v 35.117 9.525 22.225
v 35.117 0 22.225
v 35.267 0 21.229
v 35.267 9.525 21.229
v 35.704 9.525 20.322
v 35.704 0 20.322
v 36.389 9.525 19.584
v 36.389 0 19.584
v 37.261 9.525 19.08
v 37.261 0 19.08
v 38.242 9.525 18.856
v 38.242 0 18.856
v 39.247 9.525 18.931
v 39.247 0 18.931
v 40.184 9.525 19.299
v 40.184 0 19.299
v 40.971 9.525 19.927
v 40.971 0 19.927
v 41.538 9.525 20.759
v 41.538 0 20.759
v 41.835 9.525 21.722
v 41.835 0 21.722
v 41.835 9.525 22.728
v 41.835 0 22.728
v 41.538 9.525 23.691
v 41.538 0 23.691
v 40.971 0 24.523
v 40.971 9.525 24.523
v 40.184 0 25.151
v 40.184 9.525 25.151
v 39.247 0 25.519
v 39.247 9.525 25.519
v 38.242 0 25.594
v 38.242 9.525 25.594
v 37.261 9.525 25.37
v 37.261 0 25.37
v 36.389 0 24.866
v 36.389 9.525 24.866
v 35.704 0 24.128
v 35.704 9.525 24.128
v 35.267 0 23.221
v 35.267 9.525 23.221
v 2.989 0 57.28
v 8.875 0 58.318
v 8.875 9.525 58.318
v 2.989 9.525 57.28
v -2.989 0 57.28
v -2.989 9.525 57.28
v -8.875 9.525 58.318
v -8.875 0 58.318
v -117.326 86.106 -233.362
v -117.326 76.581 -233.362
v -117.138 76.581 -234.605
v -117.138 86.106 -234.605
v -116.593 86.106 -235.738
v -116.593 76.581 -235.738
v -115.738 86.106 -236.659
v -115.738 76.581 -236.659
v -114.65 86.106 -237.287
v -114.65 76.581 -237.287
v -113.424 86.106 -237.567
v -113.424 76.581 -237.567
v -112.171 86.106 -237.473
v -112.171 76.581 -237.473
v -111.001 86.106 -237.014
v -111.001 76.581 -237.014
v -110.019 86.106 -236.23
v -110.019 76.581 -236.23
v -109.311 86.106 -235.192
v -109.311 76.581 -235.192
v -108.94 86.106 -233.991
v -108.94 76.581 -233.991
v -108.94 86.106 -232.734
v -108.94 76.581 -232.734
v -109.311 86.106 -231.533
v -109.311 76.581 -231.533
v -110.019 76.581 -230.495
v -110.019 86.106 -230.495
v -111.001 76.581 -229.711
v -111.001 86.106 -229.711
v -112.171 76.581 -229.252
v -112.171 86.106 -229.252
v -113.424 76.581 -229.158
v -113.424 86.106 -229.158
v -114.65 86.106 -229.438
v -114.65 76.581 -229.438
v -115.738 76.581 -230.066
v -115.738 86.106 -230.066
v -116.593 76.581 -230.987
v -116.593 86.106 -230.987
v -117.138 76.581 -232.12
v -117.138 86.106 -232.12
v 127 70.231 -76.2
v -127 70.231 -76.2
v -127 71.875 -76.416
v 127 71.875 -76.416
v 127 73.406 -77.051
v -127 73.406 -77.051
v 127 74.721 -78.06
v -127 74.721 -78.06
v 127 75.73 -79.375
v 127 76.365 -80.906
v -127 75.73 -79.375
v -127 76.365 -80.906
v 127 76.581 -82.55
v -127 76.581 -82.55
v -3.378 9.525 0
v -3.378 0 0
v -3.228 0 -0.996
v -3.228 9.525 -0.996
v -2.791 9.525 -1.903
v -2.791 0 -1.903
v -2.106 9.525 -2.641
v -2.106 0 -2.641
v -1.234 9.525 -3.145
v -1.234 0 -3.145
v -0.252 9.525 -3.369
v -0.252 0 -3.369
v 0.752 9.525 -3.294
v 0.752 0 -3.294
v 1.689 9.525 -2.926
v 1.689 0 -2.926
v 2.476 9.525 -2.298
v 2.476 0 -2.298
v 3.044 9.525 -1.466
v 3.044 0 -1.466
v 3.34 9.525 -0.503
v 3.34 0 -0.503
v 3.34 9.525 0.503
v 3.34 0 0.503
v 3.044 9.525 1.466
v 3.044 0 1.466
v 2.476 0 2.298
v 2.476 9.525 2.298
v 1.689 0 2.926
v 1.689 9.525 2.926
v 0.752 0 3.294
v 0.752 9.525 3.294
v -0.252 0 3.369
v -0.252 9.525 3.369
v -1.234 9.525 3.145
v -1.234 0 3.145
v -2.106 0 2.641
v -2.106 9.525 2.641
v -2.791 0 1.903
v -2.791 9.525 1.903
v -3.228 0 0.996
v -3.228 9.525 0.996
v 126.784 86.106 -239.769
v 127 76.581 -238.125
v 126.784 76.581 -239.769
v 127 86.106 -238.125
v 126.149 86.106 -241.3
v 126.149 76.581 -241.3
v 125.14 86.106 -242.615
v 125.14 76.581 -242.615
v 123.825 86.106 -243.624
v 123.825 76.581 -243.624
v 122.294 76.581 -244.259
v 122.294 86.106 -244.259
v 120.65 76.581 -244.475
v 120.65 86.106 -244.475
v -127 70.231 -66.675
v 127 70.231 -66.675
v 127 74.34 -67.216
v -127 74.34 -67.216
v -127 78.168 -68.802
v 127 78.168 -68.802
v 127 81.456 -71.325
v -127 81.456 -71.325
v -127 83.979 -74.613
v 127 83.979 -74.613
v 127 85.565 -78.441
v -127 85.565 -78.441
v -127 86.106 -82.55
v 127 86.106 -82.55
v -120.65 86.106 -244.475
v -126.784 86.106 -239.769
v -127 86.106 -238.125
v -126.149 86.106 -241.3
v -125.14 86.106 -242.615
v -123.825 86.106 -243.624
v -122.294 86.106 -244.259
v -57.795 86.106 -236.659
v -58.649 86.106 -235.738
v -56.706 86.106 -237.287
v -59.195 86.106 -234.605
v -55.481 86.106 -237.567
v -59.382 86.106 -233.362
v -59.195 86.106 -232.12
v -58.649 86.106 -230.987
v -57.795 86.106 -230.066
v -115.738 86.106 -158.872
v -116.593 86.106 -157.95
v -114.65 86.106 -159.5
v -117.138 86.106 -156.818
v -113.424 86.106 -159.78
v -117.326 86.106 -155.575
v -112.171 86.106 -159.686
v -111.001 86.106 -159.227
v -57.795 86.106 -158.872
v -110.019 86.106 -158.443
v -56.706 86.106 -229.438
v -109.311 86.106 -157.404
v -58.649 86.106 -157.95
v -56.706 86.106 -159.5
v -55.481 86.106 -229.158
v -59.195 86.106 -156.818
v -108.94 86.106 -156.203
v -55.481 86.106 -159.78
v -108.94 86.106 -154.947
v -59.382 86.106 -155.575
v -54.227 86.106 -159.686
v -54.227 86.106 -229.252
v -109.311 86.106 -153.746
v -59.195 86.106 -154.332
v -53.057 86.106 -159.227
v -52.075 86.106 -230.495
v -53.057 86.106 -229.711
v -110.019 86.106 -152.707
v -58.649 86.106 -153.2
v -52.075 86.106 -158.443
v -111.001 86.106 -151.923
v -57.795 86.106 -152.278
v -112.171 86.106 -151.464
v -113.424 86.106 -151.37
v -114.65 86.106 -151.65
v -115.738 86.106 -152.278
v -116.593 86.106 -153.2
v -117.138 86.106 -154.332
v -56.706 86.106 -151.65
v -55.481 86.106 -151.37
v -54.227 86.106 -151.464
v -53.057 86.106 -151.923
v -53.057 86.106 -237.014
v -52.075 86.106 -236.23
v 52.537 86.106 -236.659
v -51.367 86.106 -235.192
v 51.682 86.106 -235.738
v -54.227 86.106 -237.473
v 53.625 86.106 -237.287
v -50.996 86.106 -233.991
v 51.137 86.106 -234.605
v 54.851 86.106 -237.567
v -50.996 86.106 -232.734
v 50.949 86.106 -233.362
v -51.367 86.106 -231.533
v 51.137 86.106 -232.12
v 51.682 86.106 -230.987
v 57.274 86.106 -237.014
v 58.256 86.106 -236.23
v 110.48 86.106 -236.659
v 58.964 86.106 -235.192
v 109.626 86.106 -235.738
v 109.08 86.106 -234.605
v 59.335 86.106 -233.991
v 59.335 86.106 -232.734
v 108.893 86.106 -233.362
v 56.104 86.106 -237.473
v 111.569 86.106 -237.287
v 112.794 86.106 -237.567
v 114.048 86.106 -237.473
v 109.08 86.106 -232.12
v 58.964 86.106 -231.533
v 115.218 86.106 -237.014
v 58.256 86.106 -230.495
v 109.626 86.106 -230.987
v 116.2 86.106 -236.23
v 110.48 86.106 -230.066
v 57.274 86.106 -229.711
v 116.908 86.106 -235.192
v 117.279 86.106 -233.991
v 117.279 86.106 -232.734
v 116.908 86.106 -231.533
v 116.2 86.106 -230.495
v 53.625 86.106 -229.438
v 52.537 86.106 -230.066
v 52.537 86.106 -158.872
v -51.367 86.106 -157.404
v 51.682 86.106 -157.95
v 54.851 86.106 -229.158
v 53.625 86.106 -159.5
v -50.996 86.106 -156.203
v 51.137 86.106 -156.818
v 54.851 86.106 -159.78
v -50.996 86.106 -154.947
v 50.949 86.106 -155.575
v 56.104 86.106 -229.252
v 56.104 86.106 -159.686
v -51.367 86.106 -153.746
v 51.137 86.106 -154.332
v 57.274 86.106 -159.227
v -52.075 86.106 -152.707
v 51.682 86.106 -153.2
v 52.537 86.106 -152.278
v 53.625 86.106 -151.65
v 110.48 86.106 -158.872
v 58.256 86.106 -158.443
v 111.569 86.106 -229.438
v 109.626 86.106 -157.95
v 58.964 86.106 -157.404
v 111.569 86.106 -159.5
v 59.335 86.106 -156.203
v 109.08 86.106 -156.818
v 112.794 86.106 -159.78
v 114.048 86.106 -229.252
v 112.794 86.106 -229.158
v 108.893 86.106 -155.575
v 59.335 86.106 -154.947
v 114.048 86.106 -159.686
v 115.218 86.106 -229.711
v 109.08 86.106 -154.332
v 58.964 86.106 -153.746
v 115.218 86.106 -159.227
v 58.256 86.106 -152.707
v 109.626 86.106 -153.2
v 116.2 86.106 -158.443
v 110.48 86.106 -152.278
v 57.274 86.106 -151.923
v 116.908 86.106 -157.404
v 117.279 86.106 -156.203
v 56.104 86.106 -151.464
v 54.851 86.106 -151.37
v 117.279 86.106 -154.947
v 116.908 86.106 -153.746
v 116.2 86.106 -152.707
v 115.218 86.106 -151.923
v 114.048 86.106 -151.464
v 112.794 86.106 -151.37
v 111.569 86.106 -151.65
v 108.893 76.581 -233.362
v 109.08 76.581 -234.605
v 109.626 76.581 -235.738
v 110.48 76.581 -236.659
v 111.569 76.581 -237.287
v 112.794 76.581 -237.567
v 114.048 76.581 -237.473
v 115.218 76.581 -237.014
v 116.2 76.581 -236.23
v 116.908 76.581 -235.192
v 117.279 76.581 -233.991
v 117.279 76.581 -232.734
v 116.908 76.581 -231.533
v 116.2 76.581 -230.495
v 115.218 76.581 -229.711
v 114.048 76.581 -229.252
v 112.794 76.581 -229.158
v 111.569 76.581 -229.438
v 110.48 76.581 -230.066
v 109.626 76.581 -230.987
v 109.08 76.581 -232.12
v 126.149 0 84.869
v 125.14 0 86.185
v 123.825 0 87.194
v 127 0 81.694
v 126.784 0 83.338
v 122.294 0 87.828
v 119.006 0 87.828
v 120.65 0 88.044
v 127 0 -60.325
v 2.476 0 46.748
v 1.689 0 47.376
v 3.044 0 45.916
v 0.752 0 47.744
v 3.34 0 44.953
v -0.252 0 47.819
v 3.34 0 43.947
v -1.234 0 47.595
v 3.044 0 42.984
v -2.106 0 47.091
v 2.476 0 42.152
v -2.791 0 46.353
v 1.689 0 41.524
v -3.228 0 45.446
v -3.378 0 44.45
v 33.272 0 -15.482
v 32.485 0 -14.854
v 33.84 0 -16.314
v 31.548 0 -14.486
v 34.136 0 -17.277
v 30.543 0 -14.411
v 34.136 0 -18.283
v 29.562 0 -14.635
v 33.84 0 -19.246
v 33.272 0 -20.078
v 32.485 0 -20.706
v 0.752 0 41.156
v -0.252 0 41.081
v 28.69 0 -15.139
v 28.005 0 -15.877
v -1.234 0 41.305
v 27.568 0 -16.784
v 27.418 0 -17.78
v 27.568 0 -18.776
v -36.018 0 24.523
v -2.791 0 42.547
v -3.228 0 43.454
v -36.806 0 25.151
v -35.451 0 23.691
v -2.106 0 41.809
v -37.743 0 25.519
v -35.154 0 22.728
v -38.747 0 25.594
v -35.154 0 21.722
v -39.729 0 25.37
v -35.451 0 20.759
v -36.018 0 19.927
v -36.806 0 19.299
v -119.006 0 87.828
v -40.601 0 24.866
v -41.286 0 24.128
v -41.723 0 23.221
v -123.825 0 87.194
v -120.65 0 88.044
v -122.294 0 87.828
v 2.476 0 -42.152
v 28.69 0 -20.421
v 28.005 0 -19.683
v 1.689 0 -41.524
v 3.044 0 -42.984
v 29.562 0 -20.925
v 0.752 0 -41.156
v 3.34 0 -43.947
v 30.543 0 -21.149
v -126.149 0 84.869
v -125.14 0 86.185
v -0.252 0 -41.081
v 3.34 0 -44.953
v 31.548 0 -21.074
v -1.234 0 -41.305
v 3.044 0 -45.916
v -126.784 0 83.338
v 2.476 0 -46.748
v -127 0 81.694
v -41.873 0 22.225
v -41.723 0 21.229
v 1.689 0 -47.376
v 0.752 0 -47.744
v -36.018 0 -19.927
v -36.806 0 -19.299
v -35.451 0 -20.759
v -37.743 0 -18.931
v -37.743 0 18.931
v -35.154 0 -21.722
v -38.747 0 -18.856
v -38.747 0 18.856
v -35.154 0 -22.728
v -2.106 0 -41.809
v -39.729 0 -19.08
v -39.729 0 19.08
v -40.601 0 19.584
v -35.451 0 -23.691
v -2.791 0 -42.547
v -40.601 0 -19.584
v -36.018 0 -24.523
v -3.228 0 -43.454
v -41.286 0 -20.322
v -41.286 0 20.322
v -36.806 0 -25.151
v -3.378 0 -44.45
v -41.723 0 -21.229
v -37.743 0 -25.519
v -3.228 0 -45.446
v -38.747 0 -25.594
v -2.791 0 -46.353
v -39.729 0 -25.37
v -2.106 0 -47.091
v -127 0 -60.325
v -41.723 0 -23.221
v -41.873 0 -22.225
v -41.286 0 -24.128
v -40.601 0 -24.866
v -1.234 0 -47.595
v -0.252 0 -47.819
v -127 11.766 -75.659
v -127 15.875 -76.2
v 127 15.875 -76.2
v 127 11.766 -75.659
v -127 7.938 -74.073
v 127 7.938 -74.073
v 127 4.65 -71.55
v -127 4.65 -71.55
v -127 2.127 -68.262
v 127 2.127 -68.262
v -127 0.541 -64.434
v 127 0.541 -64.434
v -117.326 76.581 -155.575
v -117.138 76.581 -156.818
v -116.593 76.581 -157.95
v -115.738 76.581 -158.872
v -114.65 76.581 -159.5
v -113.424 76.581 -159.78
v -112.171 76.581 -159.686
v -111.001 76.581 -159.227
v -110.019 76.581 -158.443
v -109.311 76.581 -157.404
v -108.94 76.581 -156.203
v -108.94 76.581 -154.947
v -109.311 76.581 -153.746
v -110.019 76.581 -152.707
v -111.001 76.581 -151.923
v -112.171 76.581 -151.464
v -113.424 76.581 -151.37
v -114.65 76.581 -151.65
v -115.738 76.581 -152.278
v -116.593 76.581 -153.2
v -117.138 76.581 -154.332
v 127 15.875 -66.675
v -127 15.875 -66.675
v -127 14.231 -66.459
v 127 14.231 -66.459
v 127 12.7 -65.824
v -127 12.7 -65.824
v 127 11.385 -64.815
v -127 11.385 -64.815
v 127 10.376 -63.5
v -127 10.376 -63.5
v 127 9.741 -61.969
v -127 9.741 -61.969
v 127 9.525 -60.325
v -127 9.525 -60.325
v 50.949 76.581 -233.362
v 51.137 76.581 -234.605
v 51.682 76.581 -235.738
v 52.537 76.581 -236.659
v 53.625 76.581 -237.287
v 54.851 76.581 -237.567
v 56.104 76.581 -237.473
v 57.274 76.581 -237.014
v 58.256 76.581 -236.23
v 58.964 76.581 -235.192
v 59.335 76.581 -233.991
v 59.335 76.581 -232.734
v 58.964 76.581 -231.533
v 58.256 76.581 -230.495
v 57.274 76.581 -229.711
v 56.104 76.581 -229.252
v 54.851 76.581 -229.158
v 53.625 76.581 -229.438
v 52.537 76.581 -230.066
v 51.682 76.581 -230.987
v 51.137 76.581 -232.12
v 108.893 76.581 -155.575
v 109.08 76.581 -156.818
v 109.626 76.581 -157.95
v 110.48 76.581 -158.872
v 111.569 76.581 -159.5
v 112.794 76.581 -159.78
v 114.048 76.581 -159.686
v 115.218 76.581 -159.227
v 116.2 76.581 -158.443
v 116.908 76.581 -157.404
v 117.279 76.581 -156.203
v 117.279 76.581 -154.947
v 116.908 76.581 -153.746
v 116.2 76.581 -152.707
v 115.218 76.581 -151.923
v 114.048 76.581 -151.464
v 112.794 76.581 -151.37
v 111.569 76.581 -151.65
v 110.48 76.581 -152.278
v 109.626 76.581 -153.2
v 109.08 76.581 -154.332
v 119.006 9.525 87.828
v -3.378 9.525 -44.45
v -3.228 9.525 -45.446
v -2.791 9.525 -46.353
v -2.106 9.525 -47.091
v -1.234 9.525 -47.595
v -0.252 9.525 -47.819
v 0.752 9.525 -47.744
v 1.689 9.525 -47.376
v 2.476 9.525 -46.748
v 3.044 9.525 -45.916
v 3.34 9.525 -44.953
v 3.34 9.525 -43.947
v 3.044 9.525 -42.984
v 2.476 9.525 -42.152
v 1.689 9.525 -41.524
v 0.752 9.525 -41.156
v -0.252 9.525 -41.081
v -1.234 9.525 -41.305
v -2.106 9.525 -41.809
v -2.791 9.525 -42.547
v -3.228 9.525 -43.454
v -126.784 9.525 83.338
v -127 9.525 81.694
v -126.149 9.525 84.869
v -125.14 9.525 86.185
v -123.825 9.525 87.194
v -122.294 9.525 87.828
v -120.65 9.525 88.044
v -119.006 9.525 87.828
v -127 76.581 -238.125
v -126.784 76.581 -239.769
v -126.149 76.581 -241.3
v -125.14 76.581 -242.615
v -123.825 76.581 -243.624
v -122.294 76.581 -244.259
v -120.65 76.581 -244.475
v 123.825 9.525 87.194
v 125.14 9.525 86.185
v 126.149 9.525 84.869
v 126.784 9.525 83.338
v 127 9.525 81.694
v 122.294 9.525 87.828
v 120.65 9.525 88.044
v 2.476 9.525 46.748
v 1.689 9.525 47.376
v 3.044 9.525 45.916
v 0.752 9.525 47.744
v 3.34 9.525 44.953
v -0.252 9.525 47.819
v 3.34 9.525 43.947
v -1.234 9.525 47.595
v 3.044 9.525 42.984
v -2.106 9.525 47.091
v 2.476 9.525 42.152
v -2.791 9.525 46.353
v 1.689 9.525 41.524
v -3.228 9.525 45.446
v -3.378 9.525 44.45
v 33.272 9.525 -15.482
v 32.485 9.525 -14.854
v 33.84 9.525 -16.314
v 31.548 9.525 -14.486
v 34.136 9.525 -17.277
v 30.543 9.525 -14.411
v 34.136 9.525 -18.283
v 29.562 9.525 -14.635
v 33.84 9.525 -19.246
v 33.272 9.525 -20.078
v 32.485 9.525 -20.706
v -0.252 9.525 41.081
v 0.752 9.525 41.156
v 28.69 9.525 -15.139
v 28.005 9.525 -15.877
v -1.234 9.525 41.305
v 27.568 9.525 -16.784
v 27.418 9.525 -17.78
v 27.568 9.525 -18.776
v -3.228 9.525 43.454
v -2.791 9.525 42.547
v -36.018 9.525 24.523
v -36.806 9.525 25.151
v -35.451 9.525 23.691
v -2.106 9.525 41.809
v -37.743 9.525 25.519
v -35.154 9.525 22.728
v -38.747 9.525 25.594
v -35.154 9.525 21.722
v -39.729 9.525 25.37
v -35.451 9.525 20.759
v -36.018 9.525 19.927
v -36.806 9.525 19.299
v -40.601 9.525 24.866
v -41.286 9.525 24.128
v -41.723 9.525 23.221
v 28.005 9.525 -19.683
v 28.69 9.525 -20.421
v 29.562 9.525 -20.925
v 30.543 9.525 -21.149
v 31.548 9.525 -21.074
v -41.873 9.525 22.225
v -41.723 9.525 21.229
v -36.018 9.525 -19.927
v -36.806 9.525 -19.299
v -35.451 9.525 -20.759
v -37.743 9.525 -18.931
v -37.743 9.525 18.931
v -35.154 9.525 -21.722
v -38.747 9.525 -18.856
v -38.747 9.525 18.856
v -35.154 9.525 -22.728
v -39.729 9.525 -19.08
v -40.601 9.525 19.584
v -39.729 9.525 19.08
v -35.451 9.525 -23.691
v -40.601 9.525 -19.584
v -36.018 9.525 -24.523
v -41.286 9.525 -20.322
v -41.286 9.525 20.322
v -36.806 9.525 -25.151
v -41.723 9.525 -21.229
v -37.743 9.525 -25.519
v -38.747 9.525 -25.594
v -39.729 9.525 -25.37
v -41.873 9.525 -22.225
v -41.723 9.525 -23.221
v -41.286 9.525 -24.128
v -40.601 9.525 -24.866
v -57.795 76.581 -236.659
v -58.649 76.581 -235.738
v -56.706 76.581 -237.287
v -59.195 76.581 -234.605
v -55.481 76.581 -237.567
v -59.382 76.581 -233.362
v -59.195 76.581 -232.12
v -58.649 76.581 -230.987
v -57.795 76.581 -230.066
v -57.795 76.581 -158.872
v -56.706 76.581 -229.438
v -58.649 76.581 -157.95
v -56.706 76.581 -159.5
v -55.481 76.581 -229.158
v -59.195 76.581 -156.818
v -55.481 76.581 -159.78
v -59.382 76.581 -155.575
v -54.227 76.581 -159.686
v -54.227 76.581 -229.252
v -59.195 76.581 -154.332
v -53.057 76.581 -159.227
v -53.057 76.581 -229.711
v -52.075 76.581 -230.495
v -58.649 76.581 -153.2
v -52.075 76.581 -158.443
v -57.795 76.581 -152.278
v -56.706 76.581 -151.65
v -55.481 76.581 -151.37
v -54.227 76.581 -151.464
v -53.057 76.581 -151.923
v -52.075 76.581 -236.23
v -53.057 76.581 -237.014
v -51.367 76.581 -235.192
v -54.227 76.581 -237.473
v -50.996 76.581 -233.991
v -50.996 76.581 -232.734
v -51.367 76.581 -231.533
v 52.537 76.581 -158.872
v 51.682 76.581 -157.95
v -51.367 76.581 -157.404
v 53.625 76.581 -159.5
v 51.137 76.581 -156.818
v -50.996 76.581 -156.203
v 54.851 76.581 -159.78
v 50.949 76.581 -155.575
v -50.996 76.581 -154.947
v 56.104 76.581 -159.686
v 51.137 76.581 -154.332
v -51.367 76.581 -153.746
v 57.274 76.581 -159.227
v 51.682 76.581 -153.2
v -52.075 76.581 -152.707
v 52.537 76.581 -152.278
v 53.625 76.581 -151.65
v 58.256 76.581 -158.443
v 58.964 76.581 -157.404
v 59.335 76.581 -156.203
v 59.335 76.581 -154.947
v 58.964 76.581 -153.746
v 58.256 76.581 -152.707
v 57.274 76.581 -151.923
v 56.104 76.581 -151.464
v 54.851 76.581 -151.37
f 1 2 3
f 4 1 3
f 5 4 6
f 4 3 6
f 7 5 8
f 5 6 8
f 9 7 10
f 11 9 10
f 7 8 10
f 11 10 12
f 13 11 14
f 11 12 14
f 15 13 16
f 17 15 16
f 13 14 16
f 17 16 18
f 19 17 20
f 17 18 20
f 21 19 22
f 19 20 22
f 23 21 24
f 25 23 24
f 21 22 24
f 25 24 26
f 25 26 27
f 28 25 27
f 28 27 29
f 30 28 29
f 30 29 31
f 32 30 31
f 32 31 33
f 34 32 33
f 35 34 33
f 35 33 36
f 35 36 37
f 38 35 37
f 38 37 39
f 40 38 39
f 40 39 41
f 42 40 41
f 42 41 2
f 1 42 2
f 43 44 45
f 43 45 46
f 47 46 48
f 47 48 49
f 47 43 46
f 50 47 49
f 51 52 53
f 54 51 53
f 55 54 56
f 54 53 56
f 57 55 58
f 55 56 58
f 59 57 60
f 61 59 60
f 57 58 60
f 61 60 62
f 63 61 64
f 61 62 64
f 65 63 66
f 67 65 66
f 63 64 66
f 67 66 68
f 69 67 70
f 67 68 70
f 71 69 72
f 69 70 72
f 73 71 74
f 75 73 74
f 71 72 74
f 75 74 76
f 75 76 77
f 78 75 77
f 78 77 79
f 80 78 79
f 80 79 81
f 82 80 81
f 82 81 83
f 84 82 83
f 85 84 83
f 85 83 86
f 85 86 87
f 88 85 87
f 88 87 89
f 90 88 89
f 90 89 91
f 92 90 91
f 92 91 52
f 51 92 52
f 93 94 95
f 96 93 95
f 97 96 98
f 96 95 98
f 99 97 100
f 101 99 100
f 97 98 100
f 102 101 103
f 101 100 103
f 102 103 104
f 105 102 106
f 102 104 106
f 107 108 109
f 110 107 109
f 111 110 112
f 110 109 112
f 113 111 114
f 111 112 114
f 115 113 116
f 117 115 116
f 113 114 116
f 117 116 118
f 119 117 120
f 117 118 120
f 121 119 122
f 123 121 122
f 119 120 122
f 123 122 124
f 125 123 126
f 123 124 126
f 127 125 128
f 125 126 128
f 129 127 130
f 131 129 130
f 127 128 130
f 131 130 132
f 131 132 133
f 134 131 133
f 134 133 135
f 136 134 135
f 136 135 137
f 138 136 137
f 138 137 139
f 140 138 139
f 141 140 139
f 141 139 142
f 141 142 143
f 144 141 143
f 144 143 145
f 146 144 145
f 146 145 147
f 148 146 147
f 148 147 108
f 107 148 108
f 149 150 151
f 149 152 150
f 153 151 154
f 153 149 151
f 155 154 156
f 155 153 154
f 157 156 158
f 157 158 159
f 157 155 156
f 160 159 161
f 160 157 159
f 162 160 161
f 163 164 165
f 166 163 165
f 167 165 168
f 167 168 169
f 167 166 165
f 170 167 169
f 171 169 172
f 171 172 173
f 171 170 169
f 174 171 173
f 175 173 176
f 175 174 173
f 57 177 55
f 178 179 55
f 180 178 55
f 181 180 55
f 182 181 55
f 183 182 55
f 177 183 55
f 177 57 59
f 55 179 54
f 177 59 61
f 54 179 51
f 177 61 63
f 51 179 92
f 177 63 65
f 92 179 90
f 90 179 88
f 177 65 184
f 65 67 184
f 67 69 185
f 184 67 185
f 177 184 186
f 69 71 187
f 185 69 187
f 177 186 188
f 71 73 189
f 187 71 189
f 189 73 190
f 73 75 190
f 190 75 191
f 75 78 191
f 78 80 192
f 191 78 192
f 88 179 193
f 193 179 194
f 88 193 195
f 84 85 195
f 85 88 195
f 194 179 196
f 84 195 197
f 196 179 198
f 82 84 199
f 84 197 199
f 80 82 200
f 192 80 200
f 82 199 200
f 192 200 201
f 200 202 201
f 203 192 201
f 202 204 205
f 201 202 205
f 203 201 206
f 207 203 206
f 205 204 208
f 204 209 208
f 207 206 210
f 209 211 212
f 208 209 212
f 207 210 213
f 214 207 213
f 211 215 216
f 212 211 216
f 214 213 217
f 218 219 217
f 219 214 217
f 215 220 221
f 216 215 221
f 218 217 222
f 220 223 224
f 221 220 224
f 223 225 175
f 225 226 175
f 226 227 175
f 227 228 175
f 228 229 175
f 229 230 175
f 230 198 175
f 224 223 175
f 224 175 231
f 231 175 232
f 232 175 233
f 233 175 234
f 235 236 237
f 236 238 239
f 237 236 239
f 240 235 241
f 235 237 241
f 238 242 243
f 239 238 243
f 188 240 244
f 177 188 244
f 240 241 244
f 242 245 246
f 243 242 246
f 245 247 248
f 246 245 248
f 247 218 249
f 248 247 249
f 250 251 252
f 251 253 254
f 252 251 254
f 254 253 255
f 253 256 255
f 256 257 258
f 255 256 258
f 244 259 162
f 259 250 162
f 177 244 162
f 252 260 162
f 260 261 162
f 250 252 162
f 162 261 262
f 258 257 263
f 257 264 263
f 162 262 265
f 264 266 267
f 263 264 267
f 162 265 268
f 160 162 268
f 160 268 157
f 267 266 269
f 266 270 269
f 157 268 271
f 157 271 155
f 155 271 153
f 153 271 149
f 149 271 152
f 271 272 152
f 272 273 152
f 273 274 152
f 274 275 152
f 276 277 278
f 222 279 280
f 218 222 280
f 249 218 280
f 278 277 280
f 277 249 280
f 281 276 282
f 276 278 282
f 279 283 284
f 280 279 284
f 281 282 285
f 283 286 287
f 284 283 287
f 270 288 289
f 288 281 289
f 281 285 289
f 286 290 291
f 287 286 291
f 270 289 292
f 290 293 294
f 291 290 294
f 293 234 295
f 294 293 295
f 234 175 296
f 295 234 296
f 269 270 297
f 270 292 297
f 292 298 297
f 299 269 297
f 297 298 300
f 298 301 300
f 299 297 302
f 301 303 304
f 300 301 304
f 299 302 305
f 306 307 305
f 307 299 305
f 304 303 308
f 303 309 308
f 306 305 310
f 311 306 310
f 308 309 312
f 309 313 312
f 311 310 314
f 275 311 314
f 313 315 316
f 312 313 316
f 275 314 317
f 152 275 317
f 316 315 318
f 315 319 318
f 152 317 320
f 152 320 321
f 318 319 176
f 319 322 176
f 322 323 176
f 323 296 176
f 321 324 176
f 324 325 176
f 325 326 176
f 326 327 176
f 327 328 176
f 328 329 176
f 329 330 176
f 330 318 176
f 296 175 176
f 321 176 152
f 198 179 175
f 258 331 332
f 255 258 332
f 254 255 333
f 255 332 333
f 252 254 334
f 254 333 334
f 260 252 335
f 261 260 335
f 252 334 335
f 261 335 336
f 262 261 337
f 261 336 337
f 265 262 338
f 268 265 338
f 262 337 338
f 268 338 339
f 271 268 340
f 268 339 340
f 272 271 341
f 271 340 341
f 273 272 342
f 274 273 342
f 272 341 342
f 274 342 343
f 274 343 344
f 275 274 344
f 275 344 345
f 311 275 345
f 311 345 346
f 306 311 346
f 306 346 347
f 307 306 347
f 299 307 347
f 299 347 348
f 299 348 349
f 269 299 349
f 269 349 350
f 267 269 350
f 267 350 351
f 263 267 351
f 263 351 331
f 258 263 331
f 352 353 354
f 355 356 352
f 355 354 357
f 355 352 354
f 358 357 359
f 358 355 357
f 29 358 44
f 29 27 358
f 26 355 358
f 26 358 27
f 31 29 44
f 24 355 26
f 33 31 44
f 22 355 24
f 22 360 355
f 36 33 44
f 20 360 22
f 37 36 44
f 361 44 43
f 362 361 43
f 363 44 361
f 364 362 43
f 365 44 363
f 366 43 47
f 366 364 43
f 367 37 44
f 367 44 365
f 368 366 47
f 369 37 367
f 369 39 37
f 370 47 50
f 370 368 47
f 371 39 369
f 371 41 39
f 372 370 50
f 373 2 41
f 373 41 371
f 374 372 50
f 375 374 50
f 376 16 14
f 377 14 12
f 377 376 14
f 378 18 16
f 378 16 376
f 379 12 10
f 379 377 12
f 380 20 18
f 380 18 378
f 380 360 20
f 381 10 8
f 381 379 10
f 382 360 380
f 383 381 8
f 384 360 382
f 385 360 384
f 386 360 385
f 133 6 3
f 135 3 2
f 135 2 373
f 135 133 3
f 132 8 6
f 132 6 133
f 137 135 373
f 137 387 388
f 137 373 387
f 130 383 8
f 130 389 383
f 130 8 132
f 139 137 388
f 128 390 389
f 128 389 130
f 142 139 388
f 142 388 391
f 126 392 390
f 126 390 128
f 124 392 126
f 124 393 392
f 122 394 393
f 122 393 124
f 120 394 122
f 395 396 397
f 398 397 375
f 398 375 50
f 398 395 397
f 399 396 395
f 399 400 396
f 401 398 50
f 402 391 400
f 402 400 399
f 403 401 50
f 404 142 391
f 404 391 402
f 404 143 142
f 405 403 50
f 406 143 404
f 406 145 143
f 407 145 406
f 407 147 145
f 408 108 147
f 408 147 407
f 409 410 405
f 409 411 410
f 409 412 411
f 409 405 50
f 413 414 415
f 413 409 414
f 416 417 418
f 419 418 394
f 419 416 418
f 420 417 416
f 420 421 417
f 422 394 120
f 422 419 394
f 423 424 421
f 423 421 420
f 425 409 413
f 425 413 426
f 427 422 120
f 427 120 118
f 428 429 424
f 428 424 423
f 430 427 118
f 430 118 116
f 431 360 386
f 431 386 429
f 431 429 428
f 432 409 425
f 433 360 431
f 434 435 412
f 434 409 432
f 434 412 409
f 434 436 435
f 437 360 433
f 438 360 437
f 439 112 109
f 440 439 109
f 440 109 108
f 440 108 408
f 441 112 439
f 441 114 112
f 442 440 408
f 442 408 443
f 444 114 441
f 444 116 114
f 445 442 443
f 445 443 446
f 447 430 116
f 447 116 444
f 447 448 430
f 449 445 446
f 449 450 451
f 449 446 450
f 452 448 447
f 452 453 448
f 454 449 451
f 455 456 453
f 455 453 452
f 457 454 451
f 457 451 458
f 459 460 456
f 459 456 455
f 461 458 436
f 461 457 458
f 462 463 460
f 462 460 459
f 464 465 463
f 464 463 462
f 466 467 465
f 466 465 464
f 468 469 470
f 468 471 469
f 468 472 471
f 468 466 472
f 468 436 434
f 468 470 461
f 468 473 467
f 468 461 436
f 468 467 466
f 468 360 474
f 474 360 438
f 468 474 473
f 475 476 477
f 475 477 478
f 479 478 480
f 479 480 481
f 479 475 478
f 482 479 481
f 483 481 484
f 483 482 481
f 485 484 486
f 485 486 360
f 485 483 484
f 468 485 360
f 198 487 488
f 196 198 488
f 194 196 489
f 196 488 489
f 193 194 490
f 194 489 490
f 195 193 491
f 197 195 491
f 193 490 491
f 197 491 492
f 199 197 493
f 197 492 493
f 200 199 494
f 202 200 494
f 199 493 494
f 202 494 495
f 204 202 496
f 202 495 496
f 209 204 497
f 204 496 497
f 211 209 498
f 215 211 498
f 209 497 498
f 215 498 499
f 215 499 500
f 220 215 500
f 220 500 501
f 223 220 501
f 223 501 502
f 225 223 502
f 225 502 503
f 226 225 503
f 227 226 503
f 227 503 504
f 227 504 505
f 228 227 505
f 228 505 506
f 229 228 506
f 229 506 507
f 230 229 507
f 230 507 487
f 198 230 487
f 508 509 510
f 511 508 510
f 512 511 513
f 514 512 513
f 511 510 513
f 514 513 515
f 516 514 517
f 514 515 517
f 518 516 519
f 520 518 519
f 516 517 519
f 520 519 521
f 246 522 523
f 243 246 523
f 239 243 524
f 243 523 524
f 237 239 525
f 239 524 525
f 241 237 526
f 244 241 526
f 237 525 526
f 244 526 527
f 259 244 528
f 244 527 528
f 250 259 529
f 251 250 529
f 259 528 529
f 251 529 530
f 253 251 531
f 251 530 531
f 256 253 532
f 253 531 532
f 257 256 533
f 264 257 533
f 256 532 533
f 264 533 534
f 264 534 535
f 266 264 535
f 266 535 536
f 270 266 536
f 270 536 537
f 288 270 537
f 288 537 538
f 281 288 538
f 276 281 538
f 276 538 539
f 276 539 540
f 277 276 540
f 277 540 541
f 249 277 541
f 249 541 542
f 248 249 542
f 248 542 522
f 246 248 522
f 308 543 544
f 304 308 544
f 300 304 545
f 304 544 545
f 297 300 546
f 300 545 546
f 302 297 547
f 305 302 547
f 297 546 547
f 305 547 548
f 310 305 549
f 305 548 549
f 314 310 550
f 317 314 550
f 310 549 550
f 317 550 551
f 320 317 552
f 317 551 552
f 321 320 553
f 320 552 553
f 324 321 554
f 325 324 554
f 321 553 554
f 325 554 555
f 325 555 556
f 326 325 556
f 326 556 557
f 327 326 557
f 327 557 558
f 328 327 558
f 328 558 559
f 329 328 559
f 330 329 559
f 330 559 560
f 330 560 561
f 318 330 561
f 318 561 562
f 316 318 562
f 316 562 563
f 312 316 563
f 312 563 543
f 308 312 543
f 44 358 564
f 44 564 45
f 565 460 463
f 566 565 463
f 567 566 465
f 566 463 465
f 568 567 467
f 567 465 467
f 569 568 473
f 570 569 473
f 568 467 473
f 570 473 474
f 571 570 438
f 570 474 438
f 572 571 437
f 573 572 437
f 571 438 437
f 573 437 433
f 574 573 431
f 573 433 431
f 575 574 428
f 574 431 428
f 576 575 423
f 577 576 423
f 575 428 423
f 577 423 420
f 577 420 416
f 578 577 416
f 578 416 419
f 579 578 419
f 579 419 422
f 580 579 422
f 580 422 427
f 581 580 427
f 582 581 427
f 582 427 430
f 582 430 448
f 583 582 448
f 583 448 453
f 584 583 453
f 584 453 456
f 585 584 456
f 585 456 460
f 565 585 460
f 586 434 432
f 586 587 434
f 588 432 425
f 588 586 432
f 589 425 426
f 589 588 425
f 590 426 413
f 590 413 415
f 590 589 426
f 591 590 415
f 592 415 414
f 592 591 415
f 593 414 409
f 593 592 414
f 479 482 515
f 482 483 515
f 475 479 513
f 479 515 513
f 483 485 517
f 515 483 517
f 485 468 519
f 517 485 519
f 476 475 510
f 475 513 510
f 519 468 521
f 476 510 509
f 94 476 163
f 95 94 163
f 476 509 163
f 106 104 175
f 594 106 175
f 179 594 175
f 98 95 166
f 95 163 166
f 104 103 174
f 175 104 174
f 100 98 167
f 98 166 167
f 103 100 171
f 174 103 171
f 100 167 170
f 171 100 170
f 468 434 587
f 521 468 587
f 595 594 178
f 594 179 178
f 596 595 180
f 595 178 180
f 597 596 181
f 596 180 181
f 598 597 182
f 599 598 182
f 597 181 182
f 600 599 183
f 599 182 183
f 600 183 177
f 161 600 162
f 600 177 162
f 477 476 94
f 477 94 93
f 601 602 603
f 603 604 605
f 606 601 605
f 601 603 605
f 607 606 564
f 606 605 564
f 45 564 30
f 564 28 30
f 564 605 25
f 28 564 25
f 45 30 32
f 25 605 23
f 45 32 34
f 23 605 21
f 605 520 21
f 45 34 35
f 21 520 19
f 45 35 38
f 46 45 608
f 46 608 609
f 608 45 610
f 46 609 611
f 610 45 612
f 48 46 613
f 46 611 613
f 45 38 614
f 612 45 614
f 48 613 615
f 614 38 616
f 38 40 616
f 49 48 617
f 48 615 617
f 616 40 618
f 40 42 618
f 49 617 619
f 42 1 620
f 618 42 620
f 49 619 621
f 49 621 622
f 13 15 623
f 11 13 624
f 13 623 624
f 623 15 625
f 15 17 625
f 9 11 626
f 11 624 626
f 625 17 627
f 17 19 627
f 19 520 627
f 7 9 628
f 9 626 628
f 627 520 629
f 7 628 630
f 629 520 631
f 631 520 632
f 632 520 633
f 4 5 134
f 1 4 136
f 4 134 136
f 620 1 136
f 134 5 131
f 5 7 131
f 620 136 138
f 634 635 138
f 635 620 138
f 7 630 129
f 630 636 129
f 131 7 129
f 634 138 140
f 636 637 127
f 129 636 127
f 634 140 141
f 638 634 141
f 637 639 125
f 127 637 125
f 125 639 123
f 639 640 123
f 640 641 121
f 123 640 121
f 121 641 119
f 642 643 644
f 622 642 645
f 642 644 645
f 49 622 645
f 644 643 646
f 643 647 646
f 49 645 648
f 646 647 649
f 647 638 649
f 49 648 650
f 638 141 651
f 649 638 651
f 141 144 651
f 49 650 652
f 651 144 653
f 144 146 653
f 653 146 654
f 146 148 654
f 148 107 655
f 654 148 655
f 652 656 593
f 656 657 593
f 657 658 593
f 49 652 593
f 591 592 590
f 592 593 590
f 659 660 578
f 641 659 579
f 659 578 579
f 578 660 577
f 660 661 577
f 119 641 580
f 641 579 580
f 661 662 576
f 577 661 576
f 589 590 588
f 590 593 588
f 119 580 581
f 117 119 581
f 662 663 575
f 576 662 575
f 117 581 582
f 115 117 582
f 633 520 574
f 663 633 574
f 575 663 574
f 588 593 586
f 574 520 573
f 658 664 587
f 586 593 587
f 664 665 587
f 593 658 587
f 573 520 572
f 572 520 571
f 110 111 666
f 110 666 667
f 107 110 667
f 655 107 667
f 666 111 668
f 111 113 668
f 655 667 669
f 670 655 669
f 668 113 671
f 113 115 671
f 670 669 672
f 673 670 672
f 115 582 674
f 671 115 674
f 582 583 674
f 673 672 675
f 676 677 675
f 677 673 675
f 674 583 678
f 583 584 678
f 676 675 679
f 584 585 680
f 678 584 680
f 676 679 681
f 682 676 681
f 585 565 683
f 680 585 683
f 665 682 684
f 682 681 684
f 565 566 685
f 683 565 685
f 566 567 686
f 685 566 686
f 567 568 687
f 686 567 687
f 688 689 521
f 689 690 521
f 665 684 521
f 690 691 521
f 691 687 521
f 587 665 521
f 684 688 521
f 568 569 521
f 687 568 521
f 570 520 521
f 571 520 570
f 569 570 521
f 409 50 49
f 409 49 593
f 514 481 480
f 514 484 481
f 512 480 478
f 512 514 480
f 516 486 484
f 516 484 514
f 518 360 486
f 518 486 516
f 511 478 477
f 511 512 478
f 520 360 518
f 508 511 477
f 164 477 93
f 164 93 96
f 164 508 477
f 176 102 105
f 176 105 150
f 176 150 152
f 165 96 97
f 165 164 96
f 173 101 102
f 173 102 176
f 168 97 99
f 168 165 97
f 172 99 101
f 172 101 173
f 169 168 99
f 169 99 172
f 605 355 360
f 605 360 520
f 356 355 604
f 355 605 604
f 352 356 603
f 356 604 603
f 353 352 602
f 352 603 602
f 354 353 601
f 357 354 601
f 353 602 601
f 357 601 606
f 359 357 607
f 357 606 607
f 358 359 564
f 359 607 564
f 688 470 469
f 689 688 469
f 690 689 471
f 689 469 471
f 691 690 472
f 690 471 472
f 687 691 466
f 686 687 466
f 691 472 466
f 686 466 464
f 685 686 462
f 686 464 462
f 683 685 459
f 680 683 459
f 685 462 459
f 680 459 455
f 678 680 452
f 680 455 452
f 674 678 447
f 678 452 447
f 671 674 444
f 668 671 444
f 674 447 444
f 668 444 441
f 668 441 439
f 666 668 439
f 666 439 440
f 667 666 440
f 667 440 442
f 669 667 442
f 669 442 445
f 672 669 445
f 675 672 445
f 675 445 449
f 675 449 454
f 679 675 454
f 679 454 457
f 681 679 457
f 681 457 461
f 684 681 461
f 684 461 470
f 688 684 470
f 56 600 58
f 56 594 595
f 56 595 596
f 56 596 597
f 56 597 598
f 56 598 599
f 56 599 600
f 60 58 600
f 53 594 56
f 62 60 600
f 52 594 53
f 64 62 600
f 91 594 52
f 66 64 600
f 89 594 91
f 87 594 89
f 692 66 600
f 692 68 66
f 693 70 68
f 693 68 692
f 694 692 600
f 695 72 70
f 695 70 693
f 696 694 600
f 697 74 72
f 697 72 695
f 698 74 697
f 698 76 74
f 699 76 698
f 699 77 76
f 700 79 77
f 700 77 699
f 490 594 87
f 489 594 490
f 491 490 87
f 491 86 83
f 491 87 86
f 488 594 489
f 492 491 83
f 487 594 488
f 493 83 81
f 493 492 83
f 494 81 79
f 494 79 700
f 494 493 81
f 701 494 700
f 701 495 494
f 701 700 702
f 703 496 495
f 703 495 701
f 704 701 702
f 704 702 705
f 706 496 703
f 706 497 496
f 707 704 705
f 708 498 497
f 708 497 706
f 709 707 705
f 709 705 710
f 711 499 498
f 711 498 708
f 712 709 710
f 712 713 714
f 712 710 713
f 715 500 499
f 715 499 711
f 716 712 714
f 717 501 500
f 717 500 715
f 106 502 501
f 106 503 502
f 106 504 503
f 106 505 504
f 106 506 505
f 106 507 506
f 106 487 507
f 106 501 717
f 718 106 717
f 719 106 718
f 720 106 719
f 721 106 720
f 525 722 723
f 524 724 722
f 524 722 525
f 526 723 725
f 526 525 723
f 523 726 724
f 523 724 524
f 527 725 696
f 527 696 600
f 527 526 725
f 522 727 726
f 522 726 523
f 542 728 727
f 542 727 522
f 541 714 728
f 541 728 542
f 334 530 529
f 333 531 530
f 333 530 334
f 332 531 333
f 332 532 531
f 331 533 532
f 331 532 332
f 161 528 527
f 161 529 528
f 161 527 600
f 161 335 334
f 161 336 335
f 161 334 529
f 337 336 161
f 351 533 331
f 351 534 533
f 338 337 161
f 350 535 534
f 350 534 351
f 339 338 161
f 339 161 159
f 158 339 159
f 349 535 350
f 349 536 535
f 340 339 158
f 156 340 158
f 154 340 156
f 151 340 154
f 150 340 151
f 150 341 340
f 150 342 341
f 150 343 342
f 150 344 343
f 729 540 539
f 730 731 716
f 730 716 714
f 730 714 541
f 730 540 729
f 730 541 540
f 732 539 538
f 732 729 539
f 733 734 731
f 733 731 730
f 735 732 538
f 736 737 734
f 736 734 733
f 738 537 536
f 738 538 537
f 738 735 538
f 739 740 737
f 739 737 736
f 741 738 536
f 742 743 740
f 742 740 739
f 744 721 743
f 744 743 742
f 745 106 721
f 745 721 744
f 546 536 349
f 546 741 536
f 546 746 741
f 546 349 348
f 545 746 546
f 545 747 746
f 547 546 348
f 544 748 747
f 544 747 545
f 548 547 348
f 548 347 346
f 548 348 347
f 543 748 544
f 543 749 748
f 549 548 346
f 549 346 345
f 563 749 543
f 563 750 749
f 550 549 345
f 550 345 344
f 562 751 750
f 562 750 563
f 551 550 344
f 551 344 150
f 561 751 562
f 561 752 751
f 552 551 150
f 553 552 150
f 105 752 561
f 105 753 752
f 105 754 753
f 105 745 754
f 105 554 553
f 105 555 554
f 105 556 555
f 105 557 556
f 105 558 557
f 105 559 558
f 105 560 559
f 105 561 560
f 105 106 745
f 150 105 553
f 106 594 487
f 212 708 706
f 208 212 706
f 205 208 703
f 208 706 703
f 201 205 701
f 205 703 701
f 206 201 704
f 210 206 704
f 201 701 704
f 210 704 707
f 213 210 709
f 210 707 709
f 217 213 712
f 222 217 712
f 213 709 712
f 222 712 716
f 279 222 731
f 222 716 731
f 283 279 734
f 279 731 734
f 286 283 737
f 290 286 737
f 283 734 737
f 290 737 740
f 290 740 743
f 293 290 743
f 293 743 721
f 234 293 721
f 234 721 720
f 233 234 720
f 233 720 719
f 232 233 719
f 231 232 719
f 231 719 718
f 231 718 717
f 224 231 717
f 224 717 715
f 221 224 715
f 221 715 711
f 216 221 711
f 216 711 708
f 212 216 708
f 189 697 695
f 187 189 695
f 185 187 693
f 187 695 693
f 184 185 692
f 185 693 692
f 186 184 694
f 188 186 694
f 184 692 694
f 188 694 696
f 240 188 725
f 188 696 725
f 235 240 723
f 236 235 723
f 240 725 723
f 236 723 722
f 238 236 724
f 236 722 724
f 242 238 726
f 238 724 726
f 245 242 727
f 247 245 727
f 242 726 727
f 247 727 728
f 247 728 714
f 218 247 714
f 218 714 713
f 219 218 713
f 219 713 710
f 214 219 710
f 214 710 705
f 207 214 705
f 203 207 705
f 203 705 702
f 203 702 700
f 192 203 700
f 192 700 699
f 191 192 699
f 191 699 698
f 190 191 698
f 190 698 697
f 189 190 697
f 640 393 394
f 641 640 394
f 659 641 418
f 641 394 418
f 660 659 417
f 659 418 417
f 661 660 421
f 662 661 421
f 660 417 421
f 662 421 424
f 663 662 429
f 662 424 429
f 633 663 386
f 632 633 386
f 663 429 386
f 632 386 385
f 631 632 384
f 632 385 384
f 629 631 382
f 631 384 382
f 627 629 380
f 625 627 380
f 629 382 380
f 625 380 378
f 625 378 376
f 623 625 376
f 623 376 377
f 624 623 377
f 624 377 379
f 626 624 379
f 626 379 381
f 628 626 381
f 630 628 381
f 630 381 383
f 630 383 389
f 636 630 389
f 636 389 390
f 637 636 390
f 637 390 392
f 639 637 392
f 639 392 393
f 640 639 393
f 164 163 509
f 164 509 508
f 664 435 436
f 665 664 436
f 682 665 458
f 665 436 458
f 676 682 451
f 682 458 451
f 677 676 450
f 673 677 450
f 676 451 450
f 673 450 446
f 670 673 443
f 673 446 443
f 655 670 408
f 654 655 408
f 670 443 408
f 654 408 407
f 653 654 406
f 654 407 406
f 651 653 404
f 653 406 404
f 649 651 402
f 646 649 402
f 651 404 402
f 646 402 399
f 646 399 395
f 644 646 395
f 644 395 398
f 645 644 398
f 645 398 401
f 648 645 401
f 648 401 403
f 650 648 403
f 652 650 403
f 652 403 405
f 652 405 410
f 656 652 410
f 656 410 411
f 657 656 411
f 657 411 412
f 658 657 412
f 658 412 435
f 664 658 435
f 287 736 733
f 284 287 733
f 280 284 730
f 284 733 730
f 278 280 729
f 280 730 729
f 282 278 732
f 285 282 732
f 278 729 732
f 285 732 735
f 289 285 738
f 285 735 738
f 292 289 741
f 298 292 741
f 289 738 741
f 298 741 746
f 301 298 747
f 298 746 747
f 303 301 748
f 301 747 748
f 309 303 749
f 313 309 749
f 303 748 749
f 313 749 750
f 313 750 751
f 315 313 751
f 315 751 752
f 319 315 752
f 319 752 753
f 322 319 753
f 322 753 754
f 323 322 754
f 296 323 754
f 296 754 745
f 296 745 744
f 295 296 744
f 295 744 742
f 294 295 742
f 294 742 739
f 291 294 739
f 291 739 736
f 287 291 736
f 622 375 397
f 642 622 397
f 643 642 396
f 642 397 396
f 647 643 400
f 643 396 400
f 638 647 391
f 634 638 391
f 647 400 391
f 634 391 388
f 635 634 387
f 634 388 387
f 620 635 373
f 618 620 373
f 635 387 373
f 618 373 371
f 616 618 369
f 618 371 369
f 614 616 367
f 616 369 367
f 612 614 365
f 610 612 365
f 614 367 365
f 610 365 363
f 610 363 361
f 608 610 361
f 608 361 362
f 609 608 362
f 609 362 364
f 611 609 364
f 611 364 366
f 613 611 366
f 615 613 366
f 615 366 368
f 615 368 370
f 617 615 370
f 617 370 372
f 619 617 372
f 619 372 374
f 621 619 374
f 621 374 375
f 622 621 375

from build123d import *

# Parameters (mm, degrees)
BOSS_EXTRUDE1_DEPTH      = 9.525
SKETCH2_W                = 254
SKETCH2_H                = 9.525
BOSS_EXTRUDE2_DEPTH      = 67.056
SKETCH3_W                = 254
SKETCH3_H                = 9.525
BOSS_EXTRUDE3_DEPTH      = 177.8
CONVERT_SOLID1_START     = -127
CONVERT_SOLID1_DEPTH     = 254
CONVERT_SOLID1_2_DEPTH   = 254
FILLET3_R                = 6.35
F_5_16_CLEARANCE_HOLE1_D = 8.4328
F_1_4_CLEARANCE_HOLE2_D  = 6.7564


# Read off the part's stored shape, not the designer's step: Convert-Solid1
with BuildPart() as part:
    # Sketch1 → Boss-Extrude1 (new body)
    with BuildSketch(Plane(origin=(0, 0, 0), x_dir=(1, 0, 0), z_dir=(0, 1, 0))):
        with BuildLine():
            Line((-127, 76.2), (127, 76.2))
            Line((127, 76.2), (127, -89.969927212))
            Line((127, -89.969927212), (8.874905057, -58.318403417))
            ThreePointArc((8.874905057, -58.318403417), (0, -57.15), (-8.874905057, -58.318403417))
            Line((-8.874905057, -58.318403417), (-127, -89.969927212))
            Line((-127, -89.969927212), (-127, 76.2))
        make_face()
    extrude(amount=BOSS_EXTRUDE1_DEPTH)

    # Sketch2 → Boss-Extrude2 (add)
    with BuildSketch(Plane(origin=(0, 9.525, 0), x_dir=(1, 0, 0), z_dir=(0, 1, 0))):
        with Locations((0, 71.4375)):
            Rectangle(SKETCH2_W, SKETCH2_H)
    extrude(amount=BOSS_EXTRUDE2_DEPTH)

    # Sketch3 → Boss-Extrude3 (add)
    with BuildSketch(Plane.XY.offset(-66.675)):
        with Locations((0, 81.3435)):
            Rectangle(SKETCH3_W, SKETCH3_H)
    extrude(amount=-BOSS_EXTRUDE3_DEPTH)

    # Convert-Solid1 outline → Convert-Solid1 (cut)
    with BuildSketch(Plane.YZ.offset(CONVERT_SOLID1_START)):
        with BuildLine():
            ThreePointArc((70.231, -66.675), (81.456320151, -71.324679849), (86.106, -82.55))
            Line((86.106, -82.55), (86.106, -66.675))
            Line((86.106, -66.675), (70.231, -66.675))
        make_face()
        with BuildLine():
            Line((0, -76.2), (15.875, -76.2))
            ThreePointArc((15.875, -76.2), (4.649679849, -71.550320151), (0, -60.325))
            Line((0, -60.325), (0, -76.2))
        make_face()
    extrude(amount=CONVERT_SOLID1_DEPTH, mode=Mode.SUBTRACT)

    # Convert-Solid1 2 outline → Convert-Solid1 2 (add)
    with BuildSketch(Plane.YZ.offset(CONVERT_SOLID1_START)):
        with BuildLine():
            Line((9.525, -66.675), (15.875, -66.675))
            ThreePointArc((15.875, -66.675), (11.384871939, -64.815128061), (9.525, -60.325))
            Line((9.525, -60.325), (9.525, -66.675))
        make_face()
        with BuildLine():
            ThreePointArc((70.231, -76.2), (74.721128061, -78.059871939), (76.581, -82.55))
            Line((76.581, -82.55), (76.581, -76.2))
            Line((76.581, -76.2), (70.231, -76.2))
        make_face()
    extrude(amount=CONVERT_SOLID1_2_DEPTH)

    # Fillet3
    fillet3_edges = [part.edges().sort_by_distance(p)[0] for p in [
        (127, 4.7625, 89.969927212),
        (-127, 4.7625, 89.969927212),
        (-127, 81.3435, -244.475),
        (127, 81.3435, -244.475),
    ]]
    fillet(fillet3_edges, radius=FILLET3_R)

    # 5/16 Clearance Hole1 (through all)
    with Locations(Plane(origin=(0, 86.106, 0), x_dir=(1, 0, 0), z_dir=(0, 1, 0))):
        with Locations((-113.109375, 233.3625), (-55.165625, 233.3625), (-55.165625, 155.575), (-113.109375, 155.575), (113.109375, 155.575), (55.165625, 155.575), (55.165625, 233.3625), (113.109375, 233.3625)):
            Hole(F_5_16_CLEARANCE_HOLE1_D / 2)

    # 1/4 Clearance Hole2 (through all)
    with Locations(Plane(origin=(0, 9.525, 0), x_dir=(1, 0, 0), z_dir=(0, 1, 0))):
        with Locations((0, 0), (0, 44.45), (30.795863359, 17.78), (38.494829198, -22.225), (0, -44.45), (-38.494829198, -22.225), (-38.494829198, 22.225)):
            Hole(F_1_4_CLEARANCE_HOLE2_D / 2)


solid = part.part
